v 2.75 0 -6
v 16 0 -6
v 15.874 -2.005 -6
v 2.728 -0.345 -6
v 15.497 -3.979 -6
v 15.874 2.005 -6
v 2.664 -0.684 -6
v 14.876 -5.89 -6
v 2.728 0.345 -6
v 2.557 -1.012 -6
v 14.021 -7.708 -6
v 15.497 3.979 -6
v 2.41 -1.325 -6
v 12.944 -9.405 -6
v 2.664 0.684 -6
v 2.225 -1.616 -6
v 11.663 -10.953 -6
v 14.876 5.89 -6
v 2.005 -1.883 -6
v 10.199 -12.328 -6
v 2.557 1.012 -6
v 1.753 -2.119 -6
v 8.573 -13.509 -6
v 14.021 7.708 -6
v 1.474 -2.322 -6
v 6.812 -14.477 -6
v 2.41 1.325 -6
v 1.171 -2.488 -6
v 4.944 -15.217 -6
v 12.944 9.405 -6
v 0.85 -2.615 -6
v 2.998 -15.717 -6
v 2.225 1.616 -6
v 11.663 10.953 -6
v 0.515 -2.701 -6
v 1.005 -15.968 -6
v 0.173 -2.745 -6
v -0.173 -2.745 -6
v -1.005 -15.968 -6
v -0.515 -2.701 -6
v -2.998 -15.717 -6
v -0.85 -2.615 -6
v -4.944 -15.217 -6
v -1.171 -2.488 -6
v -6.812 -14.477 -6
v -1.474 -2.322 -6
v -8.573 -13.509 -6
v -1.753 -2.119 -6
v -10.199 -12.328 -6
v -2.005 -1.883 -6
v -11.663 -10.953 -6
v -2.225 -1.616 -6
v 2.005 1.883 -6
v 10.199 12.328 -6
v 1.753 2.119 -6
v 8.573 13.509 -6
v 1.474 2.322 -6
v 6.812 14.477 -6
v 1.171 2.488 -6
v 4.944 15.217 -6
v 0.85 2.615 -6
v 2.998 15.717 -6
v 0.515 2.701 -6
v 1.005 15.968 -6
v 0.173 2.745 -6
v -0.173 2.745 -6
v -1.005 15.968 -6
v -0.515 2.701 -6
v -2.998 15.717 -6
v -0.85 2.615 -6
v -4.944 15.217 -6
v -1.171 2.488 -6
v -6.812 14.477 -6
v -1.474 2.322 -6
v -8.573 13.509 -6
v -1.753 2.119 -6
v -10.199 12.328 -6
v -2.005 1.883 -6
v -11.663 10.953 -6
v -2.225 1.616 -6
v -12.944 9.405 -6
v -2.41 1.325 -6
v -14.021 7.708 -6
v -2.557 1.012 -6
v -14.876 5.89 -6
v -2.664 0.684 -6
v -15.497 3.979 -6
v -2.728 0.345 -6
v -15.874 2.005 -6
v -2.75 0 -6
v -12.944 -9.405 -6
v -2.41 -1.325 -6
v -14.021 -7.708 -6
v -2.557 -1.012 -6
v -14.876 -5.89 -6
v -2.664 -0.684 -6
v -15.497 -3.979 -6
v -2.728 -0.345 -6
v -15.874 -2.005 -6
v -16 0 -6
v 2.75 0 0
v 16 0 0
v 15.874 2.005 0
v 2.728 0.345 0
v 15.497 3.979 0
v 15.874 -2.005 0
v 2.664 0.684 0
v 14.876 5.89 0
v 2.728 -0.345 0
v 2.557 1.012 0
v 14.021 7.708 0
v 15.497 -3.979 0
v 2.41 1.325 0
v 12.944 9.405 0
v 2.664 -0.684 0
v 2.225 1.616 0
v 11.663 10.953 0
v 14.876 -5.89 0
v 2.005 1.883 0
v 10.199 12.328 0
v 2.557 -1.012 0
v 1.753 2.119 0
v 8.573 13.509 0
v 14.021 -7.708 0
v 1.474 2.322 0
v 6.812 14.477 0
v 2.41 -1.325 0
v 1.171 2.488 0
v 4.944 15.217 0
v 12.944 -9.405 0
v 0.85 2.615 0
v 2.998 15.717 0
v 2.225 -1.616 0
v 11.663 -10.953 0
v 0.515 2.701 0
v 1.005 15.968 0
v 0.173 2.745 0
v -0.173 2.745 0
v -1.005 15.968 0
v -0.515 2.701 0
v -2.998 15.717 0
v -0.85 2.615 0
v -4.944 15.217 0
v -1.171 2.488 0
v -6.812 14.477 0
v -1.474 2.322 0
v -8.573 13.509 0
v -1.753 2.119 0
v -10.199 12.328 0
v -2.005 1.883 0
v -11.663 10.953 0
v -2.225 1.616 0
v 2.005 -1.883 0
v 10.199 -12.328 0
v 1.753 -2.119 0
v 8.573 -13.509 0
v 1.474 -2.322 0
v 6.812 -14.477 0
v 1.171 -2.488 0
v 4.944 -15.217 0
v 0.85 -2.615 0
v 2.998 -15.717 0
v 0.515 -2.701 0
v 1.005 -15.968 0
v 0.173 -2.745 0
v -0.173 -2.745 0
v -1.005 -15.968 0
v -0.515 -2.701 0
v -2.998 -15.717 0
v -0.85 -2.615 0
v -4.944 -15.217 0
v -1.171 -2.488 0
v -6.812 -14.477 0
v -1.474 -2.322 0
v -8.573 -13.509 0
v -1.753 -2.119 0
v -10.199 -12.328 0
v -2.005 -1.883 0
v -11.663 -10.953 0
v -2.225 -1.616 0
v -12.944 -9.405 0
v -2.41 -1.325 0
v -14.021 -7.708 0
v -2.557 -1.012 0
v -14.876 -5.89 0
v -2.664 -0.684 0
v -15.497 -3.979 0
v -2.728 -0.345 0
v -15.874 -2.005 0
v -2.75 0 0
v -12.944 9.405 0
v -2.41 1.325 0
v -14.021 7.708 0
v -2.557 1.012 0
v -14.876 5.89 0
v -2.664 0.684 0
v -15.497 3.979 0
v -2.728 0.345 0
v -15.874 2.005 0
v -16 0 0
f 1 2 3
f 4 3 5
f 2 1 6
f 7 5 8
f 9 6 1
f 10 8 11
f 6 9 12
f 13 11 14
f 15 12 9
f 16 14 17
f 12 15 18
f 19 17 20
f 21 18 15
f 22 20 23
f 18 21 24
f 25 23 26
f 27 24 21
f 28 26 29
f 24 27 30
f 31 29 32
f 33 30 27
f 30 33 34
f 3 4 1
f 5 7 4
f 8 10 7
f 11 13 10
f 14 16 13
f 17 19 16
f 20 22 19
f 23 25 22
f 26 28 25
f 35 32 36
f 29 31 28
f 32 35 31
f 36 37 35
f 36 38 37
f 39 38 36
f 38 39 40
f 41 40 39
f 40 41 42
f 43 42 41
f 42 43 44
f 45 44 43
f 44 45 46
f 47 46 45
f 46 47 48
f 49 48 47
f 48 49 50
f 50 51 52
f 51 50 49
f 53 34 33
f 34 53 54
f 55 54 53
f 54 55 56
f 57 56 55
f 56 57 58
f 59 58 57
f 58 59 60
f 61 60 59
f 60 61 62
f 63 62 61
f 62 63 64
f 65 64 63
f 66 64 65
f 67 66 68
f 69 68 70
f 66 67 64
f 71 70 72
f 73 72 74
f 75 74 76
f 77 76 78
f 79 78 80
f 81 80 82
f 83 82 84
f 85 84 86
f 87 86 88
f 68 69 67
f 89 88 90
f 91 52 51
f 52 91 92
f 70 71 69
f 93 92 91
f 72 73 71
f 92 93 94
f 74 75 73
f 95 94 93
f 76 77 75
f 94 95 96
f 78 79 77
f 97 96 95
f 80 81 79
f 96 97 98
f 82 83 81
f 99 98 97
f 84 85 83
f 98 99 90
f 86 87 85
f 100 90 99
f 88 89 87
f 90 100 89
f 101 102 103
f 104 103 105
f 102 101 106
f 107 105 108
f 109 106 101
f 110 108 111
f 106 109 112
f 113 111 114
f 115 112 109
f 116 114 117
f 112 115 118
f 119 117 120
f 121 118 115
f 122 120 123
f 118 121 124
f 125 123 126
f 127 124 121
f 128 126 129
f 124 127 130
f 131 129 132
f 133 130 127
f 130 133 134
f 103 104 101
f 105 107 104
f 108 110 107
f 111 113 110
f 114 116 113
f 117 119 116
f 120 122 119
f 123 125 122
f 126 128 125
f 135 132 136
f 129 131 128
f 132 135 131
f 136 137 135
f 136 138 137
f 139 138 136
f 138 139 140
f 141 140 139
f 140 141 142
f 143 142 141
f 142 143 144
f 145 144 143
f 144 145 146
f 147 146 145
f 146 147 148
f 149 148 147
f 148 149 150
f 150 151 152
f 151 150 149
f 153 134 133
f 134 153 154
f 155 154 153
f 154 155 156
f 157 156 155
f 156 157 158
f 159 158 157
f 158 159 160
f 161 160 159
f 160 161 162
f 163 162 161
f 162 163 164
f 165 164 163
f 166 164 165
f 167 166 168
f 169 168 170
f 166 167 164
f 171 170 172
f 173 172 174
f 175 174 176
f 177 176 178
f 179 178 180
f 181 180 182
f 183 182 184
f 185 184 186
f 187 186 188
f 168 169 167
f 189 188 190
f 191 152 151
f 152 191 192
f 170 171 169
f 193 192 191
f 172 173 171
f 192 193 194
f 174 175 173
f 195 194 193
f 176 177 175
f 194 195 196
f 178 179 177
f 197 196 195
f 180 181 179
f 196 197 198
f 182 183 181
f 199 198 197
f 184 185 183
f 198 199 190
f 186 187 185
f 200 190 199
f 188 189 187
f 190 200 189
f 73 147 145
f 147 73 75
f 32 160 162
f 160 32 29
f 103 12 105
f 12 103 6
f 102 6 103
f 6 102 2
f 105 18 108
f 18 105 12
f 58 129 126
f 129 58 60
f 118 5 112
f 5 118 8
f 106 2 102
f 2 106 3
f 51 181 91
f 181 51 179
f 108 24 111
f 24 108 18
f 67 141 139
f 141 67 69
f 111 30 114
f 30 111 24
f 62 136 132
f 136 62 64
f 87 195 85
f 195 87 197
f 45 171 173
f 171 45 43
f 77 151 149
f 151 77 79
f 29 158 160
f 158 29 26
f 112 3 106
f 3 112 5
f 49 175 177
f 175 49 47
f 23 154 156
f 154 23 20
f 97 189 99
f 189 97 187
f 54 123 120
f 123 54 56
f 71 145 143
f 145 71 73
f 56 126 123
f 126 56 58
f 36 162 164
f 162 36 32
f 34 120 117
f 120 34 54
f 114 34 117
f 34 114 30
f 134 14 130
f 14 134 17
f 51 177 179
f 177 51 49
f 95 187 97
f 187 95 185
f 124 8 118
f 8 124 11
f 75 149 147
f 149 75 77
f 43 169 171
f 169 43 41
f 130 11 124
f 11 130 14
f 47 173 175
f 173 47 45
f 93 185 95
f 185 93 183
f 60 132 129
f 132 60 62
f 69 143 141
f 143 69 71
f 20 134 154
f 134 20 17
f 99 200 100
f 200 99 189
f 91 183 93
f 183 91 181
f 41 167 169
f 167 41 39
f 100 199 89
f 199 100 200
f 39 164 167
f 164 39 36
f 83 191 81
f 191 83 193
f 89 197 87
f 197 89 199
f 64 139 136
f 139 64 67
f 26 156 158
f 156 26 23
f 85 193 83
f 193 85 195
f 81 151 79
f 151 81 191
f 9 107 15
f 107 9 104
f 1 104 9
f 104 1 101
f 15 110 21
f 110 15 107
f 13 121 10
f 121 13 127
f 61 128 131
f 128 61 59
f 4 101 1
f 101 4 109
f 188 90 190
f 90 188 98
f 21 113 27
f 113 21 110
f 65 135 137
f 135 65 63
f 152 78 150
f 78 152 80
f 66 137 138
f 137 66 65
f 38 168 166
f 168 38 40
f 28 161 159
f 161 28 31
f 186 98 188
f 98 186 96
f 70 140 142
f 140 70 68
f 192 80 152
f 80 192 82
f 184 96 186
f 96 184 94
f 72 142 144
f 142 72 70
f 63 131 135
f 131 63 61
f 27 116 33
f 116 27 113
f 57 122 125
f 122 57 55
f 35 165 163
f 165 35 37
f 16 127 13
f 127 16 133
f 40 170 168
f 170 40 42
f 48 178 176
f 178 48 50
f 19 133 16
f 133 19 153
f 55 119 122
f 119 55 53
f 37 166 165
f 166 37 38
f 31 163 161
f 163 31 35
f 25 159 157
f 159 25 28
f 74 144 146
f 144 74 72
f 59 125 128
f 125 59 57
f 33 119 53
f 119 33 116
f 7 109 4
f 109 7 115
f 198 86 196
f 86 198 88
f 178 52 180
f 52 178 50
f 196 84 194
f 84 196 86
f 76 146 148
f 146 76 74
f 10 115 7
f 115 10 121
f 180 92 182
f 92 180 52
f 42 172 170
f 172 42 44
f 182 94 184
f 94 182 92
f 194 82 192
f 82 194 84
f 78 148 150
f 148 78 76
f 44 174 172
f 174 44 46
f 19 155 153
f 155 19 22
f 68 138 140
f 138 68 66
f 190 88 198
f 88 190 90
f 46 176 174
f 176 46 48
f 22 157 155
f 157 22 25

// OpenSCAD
$fn = 50;


difference() {
	union() {
		translate(v = [0, 0, -6.0000000000]) {
			cylinder(h = 6, r = 10.0000000000);
		}
		translate(v = [0, 0, -6.0000000000]) {
			cylinder(h = 6, r = 16.0000000000);
		}
	}
	union() {
		#translate(v = [0, 0, -6]) {
			cylinder(h = 6, r = 2.7500000000);
		}
	}
}
